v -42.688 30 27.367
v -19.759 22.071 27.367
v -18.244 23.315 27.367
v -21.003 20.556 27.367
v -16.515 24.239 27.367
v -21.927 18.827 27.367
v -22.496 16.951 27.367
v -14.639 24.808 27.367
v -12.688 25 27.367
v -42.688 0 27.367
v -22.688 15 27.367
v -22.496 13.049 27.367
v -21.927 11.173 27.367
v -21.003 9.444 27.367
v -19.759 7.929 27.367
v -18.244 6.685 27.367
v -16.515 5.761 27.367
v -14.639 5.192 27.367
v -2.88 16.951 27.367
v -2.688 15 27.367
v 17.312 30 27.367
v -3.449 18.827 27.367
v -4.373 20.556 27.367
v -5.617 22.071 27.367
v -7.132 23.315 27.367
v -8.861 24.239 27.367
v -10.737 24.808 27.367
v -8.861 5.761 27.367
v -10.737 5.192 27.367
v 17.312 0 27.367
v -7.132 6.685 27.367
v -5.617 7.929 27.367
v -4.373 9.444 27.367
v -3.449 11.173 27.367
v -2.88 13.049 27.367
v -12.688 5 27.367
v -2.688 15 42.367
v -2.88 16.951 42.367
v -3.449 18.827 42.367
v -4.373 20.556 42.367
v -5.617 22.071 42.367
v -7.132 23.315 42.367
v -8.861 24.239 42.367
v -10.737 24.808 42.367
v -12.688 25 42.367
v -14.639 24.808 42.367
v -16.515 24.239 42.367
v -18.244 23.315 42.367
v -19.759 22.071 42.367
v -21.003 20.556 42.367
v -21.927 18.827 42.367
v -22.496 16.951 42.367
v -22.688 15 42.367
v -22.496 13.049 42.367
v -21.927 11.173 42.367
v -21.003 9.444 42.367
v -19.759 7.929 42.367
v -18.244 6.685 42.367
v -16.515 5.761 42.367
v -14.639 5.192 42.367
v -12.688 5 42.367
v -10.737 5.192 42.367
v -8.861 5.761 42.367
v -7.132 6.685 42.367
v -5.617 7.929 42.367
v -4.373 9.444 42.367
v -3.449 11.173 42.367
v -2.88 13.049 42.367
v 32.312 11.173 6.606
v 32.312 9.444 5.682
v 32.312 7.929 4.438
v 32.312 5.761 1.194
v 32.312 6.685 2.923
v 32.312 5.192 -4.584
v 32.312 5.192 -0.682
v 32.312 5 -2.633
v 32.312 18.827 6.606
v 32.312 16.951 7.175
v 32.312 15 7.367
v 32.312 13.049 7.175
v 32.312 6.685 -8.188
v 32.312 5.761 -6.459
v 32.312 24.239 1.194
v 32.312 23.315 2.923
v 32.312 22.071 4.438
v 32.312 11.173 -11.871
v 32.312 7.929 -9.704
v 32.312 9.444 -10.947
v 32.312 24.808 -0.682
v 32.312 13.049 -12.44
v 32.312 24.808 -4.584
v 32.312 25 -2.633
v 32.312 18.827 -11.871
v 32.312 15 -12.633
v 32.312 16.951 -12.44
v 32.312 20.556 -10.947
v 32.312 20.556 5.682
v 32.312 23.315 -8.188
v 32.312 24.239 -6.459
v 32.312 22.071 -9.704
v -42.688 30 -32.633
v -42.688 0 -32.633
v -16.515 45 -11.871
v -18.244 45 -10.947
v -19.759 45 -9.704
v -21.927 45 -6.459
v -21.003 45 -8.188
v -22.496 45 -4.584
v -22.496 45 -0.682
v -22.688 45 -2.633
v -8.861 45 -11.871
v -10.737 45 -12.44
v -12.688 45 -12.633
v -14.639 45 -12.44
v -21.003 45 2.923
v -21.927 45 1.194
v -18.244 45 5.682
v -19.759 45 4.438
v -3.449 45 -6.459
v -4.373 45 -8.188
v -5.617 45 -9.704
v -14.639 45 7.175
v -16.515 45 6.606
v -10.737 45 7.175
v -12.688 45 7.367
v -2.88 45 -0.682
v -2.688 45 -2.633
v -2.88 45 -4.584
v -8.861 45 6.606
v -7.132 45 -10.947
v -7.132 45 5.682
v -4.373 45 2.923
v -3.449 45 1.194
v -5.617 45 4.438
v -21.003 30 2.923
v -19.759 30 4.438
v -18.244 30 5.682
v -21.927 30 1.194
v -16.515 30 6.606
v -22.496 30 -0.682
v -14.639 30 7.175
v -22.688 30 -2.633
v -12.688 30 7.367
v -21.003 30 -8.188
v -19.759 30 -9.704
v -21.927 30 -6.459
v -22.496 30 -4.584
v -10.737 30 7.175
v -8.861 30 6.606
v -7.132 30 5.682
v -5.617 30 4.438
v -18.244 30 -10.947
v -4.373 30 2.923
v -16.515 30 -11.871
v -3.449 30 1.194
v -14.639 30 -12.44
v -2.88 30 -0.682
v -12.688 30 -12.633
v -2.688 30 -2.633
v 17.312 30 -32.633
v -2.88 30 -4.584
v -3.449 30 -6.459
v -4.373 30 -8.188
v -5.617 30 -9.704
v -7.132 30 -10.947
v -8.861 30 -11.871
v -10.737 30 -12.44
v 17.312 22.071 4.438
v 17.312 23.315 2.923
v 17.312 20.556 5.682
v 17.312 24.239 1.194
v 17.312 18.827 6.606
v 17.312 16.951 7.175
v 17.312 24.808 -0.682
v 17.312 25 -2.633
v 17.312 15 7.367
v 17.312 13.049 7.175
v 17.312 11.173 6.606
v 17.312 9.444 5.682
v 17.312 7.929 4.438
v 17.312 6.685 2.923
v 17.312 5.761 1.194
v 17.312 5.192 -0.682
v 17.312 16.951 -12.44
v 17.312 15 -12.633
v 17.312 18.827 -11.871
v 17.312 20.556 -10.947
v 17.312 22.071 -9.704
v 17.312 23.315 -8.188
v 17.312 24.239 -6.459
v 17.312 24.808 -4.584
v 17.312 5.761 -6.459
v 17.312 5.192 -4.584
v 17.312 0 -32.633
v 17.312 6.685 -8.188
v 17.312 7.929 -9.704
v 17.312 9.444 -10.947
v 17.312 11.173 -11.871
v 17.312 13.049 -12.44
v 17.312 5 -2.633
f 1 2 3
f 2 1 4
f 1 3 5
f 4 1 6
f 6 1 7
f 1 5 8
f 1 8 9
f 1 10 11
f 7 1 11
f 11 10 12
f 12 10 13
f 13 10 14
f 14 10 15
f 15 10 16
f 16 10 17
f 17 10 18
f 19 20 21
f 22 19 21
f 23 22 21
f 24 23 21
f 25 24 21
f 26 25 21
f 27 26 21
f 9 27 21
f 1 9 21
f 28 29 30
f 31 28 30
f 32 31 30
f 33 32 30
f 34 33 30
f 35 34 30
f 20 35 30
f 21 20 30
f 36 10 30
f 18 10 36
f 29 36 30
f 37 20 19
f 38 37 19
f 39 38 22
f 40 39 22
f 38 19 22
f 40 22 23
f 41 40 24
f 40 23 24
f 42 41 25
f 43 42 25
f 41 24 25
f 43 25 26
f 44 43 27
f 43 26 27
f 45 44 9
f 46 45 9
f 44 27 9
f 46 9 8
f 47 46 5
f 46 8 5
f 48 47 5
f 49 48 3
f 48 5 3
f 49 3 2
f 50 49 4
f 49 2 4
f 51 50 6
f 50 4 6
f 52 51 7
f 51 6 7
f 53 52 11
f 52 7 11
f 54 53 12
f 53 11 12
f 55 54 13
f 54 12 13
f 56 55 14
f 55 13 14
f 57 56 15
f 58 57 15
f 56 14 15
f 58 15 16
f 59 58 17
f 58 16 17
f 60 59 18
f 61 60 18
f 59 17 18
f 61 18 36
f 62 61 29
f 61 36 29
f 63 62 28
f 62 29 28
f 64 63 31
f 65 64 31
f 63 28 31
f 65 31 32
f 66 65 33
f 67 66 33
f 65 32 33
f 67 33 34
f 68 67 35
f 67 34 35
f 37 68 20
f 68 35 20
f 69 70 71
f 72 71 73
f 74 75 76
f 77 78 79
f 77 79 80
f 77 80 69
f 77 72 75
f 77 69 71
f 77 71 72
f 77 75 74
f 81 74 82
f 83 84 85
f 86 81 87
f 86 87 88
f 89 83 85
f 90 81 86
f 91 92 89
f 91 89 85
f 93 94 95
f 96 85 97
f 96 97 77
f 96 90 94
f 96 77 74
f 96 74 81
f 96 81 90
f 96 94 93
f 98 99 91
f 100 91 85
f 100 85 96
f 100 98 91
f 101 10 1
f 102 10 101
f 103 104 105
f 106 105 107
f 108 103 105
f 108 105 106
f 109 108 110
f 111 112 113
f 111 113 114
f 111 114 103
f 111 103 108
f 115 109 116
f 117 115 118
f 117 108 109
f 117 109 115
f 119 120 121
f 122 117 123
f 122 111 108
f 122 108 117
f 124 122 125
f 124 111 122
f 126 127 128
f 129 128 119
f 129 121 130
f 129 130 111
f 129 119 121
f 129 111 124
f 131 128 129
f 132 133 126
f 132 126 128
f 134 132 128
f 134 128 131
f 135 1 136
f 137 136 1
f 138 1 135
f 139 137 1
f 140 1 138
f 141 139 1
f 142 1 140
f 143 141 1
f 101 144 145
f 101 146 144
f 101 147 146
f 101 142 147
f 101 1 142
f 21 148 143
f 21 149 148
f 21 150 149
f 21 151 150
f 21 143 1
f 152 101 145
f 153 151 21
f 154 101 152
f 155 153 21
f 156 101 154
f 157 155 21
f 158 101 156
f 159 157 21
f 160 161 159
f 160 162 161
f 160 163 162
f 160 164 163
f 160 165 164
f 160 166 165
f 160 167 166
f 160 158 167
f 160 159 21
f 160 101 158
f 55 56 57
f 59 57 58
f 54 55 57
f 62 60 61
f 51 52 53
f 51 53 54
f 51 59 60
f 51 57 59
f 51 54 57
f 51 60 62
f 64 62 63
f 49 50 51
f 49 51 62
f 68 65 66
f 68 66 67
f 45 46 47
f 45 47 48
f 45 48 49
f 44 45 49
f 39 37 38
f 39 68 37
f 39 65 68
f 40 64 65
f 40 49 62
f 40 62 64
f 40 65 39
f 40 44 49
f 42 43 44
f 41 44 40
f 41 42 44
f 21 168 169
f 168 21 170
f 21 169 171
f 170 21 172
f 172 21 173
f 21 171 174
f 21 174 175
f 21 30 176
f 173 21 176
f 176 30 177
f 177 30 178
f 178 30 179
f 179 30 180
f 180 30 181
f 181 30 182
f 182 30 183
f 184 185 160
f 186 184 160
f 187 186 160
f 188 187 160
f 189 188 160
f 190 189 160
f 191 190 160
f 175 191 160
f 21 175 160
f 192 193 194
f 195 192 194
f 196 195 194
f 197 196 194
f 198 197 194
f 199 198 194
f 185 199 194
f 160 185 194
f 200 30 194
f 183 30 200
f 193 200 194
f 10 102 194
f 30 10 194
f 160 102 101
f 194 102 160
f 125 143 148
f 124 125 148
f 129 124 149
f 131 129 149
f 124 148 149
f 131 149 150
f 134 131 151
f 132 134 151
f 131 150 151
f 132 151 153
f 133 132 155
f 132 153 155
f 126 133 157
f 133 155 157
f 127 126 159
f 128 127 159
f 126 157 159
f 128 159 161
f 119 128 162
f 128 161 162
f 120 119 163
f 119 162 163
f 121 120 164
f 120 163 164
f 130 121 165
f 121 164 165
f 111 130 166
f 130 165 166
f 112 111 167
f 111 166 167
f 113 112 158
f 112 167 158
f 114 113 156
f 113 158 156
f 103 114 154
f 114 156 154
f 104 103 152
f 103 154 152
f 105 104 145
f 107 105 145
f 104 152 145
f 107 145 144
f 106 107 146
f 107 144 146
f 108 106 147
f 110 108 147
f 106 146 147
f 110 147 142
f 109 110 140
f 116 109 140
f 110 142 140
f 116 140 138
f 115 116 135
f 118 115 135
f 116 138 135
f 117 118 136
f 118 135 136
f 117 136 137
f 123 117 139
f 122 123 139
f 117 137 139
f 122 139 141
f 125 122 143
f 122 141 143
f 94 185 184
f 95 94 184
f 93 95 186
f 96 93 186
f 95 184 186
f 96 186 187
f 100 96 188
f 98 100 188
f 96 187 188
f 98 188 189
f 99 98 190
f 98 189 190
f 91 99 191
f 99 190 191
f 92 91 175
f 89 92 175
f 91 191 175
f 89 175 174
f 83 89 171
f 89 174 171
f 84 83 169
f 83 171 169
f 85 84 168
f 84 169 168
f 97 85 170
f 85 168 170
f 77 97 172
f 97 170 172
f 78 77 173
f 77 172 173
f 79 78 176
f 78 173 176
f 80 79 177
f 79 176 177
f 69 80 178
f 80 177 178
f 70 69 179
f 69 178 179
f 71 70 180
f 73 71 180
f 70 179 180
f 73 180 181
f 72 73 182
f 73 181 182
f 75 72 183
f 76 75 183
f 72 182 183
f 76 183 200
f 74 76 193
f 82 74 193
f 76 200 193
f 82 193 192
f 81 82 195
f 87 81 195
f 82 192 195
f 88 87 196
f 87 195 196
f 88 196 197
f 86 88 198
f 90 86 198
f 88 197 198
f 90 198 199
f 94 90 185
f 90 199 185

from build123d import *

# Parameters (mm, degrees)
SKETCH_1_W      = 60
SKETCH_1_H      = 60
EXTRUDE_1_DEPTH = 30
SKETCH_2_R      = 10
EXTRUDE_2_DEPTH = 15
SKETCH_4_R      = 10
EXTRUDE_3_DEPTH = 15
SKETCH_5_R      = 10
EXTRUDE_4_DEPTH = 15


with BuildPart() as part:
    # 스케치1 → 보스-돌출1 (new body)
    with BuildSketch(Plane(origin=(0, 0, 0), x_dir=(1, 0, 0), z_dir=(0, 1, 0))):
        with Locations((-12.687876758, 2.632618888)):
            Rectangle(SKETCH_1_W, SKETCH_1_H)
    extrude(amount=EXTRUDE_1_DEPTH)

    # 스케치2 → 보스-돌출2 (add)
    with BuildSketch(Plane(origin=(17.312123242, 0, 0), x_dir=(0, 0, -1), z_dir=(1, 0, 0))):
        with Locations((2.632618888, 15)):
            Circle(SKETCH_2_R)
    extrude(amount=EXTRUDE_2_DEPTH)

    # 스케치4 → 보스-돌출3 (add)
    with BuildSketch(Plane.XY.offset(27.367381112)):
        with Locations((-12.687876758, 15)):
            Circle(SKETCH_4_R)
    extrude(amount=EXTRUDE_3_DEPTH)

    # 스케치5 → 보스-돌출4 (add)
    with BuildSketch(Plane(origin=(0, 30, 0), x_dir=(1, 0, 0), z_dir=(0, 1, 0))):
        with Locations(Location((-12.687876758, 2.632618888, 0), (0, 0, 270))):
            Circle(SKETCH_5_R)
    extrude(amount=EXTRUDE_4_DEPTH)


solid = part.part
